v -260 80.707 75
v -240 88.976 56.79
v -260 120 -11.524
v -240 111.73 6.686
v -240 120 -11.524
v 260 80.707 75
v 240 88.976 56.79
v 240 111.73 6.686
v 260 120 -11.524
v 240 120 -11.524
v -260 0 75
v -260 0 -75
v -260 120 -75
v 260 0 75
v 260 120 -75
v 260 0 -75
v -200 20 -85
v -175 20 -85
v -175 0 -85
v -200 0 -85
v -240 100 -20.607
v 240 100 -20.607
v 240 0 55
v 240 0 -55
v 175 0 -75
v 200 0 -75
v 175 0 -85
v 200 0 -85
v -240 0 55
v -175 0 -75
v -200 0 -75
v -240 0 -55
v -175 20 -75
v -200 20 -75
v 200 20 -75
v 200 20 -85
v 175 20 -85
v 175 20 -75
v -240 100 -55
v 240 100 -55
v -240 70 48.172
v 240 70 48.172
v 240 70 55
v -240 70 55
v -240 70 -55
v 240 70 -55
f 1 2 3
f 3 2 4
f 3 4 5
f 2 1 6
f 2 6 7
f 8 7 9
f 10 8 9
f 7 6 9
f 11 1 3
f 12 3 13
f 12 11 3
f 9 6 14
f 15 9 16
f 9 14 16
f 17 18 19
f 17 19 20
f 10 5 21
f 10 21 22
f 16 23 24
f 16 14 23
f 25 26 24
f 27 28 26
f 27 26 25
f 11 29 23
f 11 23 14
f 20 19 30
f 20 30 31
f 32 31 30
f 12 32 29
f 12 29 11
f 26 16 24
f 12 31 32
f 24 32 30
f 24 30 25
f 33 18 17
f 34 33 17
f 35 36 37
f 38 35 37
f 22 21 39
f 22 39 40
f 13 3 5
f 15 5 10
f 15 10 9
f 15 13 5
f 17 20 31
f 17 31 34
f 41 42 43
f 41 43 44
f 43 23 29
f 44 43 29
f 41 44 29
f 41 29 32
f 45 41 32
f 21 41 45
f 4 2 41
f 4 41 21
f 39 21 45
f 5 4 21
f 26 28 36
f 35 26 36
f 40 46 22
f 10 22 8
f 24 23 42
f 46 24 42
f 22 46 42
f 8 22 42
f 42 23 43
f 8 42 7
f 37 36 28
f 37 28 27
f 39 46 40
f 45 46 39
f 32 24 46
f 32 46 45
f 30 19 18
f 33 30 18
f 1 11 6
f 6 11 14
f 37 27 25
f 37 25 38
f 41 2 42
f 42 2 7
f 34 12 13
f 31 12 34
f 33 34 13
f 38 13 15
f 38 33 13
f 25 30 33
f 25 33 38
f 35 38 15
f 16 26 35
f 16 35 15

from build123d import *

# Parameters (mm, degrees)
SKETCH_1_W          = 520
SKETCH_1_H          = 150
EXTRUDE_1_DEPTH     = 80
SKETCH_3_W          = 520
SKETCH_3_H          = 150
EXTRUDE_2_DEPTH     = 40
CUT_EXTRUDE_1_DEPTH = 539.910938839
SKETCH_5_W          = 480
SKETCH_5_H          = 110
CUT_EXTRUDE_2_DEPTH = 70
SKETCH_7_W          = 480
SKETCH_7_H          = 55.028629816
CUT_EXTRUDE_3_DEPTH = 70
SKETCH_8_W          = 480
SKETCH_8_H          = 42.734816303
CUT_EXTRUDE_5_DEPTH = 30
SKETCH_9_W          = 480
SKETCH_9_H          = 45.831744101
CUT_EXTRUDE_6_DEPTH = 20
SKETCH_10_W         = 25
SKETCH_10_H         = 20
EXTRUDE_3_DEPTH     = 20
SKETCH_11_W         = 25
SKETCH_11_H         = 20
EXTRUDE_4_DEPTH     = 20


with BuildPart() as part:
    # 草圖1 → 填料-伸長1 (new body)
    with BuildSketch(Plane(origin=(0, 0, 0), x_dir=(1, 0, 0), z_dir=(0, 1, 0))):
        Rectangle(SKETCH_1_W, SKETCH_1_H)
    extrude(amount=EXTRUDE_1_DEPTH)

    # 草圖3 → 填料-伸長2 (add)
    with BuildSketch(Plane(origin=(0, 80, 0), x_dir=(1, 0, 0), z_dir=(0, 1, 0))):
        Rectangle(SKETCH_3_W, SKETCH_3_H)
    extrude(amount=EXTRUDE_2_DEPTH)

    # 草圖4 → 除料-伸長1 (cut, through all)
    with BuildSketch(Plane(origin=(260, 0, 0), x_dir=(0, 0, -1), z_dir=(1, 0, 0))):
        Polygon((-75, 80.706622888), (11.524395402, 120), (-75, 120), align=None)
    extrude(amount=-CUT_EXTRUDE_1_DEPTH, mode=Mode.SUBTRACT)

    # 草圖5 → 除料-伸長2 (cut)
    with BuildSketch(Plane(origin=(0, 0, 0), x_dir=(-1, 0, 0), z_dir=(0, -1, 0))):
        Rectangle(SKETCH_5_W, SKETCH_5_H)
    extrude(amount=-CUT_EXTRUDE_2_DEPTH, mode=Mode.SUBTRACT)

    # 草圖7 → 除料-伸長3 (cut)
    with BuildSketch(Plane(origin=(0, 95.144358744, 43.207966387), x_dir=(1, 0, 0), z_dir=(0, 0.9105087126935232, 0.4134898839260561))):
        with Locations((0, 12.597533586)):
            Rectangle(SKETCH_7_W, SKETCH_7_H)
    extrude(amount=-CUT_EXTRUDE_3_DEPTH, mode=Mode.SUBTRACT)

    # 草圖8 → 除料-伸長5 (cut)
    with BuildSketch(Plane.XZ.offset(-70)):
        with Locations((0, -33.632591848)):
            Rectangle(SKETCH_8_W, SKETCH_8_H)
    extrude(amount=-CUT_EXTRUDE_5_DEPTH, mode=Mode.SUBTRACT)

    # 草圖9 → 除料-伸長6 (cut)
    with BuildSketch(Plane(origin=(0, 16.585843578, -36.522187536), x_dir=(1, 0, 0), z_dir=(0, -0.4134898839260561, 0.9105087126935232))):
        with Locations((0, 81.579952556)):
            Rectangle(SKETCH_9_W, SKETCH_9_H)
    extrude(amount=-CUT_EXTRUDE_6_DEPTH, mode=Mode.SUBTRACT)

    # 草圖10 → 填料-伸長3 (add)
    with BuildSketch(Plane(origin=(0, 0, -85), x_dir=(-1, 0, 0), z_dir=(0, 0, -1))):
        with Locations((-187.5, 10)):
            Rectangle(SKETCH_10_W, SKETCH_10_H)
    extrude(amount=-EXTRUDE_3_DEPTH)

    # 草圖11 → 填料-伸長4 (add)
    with BuildSketch(Plane(origin=(0, 0, -85), x_dir=(-1, 0, 0), z_dir=(0, 0, -1))):
        with Locations((187.5, 10)):
            Rectangle(SKETCH_11_W, SKETCH_11_H)
    extrude(amount=-EXTRUDE_4_DEPTH)


solid = part.part
